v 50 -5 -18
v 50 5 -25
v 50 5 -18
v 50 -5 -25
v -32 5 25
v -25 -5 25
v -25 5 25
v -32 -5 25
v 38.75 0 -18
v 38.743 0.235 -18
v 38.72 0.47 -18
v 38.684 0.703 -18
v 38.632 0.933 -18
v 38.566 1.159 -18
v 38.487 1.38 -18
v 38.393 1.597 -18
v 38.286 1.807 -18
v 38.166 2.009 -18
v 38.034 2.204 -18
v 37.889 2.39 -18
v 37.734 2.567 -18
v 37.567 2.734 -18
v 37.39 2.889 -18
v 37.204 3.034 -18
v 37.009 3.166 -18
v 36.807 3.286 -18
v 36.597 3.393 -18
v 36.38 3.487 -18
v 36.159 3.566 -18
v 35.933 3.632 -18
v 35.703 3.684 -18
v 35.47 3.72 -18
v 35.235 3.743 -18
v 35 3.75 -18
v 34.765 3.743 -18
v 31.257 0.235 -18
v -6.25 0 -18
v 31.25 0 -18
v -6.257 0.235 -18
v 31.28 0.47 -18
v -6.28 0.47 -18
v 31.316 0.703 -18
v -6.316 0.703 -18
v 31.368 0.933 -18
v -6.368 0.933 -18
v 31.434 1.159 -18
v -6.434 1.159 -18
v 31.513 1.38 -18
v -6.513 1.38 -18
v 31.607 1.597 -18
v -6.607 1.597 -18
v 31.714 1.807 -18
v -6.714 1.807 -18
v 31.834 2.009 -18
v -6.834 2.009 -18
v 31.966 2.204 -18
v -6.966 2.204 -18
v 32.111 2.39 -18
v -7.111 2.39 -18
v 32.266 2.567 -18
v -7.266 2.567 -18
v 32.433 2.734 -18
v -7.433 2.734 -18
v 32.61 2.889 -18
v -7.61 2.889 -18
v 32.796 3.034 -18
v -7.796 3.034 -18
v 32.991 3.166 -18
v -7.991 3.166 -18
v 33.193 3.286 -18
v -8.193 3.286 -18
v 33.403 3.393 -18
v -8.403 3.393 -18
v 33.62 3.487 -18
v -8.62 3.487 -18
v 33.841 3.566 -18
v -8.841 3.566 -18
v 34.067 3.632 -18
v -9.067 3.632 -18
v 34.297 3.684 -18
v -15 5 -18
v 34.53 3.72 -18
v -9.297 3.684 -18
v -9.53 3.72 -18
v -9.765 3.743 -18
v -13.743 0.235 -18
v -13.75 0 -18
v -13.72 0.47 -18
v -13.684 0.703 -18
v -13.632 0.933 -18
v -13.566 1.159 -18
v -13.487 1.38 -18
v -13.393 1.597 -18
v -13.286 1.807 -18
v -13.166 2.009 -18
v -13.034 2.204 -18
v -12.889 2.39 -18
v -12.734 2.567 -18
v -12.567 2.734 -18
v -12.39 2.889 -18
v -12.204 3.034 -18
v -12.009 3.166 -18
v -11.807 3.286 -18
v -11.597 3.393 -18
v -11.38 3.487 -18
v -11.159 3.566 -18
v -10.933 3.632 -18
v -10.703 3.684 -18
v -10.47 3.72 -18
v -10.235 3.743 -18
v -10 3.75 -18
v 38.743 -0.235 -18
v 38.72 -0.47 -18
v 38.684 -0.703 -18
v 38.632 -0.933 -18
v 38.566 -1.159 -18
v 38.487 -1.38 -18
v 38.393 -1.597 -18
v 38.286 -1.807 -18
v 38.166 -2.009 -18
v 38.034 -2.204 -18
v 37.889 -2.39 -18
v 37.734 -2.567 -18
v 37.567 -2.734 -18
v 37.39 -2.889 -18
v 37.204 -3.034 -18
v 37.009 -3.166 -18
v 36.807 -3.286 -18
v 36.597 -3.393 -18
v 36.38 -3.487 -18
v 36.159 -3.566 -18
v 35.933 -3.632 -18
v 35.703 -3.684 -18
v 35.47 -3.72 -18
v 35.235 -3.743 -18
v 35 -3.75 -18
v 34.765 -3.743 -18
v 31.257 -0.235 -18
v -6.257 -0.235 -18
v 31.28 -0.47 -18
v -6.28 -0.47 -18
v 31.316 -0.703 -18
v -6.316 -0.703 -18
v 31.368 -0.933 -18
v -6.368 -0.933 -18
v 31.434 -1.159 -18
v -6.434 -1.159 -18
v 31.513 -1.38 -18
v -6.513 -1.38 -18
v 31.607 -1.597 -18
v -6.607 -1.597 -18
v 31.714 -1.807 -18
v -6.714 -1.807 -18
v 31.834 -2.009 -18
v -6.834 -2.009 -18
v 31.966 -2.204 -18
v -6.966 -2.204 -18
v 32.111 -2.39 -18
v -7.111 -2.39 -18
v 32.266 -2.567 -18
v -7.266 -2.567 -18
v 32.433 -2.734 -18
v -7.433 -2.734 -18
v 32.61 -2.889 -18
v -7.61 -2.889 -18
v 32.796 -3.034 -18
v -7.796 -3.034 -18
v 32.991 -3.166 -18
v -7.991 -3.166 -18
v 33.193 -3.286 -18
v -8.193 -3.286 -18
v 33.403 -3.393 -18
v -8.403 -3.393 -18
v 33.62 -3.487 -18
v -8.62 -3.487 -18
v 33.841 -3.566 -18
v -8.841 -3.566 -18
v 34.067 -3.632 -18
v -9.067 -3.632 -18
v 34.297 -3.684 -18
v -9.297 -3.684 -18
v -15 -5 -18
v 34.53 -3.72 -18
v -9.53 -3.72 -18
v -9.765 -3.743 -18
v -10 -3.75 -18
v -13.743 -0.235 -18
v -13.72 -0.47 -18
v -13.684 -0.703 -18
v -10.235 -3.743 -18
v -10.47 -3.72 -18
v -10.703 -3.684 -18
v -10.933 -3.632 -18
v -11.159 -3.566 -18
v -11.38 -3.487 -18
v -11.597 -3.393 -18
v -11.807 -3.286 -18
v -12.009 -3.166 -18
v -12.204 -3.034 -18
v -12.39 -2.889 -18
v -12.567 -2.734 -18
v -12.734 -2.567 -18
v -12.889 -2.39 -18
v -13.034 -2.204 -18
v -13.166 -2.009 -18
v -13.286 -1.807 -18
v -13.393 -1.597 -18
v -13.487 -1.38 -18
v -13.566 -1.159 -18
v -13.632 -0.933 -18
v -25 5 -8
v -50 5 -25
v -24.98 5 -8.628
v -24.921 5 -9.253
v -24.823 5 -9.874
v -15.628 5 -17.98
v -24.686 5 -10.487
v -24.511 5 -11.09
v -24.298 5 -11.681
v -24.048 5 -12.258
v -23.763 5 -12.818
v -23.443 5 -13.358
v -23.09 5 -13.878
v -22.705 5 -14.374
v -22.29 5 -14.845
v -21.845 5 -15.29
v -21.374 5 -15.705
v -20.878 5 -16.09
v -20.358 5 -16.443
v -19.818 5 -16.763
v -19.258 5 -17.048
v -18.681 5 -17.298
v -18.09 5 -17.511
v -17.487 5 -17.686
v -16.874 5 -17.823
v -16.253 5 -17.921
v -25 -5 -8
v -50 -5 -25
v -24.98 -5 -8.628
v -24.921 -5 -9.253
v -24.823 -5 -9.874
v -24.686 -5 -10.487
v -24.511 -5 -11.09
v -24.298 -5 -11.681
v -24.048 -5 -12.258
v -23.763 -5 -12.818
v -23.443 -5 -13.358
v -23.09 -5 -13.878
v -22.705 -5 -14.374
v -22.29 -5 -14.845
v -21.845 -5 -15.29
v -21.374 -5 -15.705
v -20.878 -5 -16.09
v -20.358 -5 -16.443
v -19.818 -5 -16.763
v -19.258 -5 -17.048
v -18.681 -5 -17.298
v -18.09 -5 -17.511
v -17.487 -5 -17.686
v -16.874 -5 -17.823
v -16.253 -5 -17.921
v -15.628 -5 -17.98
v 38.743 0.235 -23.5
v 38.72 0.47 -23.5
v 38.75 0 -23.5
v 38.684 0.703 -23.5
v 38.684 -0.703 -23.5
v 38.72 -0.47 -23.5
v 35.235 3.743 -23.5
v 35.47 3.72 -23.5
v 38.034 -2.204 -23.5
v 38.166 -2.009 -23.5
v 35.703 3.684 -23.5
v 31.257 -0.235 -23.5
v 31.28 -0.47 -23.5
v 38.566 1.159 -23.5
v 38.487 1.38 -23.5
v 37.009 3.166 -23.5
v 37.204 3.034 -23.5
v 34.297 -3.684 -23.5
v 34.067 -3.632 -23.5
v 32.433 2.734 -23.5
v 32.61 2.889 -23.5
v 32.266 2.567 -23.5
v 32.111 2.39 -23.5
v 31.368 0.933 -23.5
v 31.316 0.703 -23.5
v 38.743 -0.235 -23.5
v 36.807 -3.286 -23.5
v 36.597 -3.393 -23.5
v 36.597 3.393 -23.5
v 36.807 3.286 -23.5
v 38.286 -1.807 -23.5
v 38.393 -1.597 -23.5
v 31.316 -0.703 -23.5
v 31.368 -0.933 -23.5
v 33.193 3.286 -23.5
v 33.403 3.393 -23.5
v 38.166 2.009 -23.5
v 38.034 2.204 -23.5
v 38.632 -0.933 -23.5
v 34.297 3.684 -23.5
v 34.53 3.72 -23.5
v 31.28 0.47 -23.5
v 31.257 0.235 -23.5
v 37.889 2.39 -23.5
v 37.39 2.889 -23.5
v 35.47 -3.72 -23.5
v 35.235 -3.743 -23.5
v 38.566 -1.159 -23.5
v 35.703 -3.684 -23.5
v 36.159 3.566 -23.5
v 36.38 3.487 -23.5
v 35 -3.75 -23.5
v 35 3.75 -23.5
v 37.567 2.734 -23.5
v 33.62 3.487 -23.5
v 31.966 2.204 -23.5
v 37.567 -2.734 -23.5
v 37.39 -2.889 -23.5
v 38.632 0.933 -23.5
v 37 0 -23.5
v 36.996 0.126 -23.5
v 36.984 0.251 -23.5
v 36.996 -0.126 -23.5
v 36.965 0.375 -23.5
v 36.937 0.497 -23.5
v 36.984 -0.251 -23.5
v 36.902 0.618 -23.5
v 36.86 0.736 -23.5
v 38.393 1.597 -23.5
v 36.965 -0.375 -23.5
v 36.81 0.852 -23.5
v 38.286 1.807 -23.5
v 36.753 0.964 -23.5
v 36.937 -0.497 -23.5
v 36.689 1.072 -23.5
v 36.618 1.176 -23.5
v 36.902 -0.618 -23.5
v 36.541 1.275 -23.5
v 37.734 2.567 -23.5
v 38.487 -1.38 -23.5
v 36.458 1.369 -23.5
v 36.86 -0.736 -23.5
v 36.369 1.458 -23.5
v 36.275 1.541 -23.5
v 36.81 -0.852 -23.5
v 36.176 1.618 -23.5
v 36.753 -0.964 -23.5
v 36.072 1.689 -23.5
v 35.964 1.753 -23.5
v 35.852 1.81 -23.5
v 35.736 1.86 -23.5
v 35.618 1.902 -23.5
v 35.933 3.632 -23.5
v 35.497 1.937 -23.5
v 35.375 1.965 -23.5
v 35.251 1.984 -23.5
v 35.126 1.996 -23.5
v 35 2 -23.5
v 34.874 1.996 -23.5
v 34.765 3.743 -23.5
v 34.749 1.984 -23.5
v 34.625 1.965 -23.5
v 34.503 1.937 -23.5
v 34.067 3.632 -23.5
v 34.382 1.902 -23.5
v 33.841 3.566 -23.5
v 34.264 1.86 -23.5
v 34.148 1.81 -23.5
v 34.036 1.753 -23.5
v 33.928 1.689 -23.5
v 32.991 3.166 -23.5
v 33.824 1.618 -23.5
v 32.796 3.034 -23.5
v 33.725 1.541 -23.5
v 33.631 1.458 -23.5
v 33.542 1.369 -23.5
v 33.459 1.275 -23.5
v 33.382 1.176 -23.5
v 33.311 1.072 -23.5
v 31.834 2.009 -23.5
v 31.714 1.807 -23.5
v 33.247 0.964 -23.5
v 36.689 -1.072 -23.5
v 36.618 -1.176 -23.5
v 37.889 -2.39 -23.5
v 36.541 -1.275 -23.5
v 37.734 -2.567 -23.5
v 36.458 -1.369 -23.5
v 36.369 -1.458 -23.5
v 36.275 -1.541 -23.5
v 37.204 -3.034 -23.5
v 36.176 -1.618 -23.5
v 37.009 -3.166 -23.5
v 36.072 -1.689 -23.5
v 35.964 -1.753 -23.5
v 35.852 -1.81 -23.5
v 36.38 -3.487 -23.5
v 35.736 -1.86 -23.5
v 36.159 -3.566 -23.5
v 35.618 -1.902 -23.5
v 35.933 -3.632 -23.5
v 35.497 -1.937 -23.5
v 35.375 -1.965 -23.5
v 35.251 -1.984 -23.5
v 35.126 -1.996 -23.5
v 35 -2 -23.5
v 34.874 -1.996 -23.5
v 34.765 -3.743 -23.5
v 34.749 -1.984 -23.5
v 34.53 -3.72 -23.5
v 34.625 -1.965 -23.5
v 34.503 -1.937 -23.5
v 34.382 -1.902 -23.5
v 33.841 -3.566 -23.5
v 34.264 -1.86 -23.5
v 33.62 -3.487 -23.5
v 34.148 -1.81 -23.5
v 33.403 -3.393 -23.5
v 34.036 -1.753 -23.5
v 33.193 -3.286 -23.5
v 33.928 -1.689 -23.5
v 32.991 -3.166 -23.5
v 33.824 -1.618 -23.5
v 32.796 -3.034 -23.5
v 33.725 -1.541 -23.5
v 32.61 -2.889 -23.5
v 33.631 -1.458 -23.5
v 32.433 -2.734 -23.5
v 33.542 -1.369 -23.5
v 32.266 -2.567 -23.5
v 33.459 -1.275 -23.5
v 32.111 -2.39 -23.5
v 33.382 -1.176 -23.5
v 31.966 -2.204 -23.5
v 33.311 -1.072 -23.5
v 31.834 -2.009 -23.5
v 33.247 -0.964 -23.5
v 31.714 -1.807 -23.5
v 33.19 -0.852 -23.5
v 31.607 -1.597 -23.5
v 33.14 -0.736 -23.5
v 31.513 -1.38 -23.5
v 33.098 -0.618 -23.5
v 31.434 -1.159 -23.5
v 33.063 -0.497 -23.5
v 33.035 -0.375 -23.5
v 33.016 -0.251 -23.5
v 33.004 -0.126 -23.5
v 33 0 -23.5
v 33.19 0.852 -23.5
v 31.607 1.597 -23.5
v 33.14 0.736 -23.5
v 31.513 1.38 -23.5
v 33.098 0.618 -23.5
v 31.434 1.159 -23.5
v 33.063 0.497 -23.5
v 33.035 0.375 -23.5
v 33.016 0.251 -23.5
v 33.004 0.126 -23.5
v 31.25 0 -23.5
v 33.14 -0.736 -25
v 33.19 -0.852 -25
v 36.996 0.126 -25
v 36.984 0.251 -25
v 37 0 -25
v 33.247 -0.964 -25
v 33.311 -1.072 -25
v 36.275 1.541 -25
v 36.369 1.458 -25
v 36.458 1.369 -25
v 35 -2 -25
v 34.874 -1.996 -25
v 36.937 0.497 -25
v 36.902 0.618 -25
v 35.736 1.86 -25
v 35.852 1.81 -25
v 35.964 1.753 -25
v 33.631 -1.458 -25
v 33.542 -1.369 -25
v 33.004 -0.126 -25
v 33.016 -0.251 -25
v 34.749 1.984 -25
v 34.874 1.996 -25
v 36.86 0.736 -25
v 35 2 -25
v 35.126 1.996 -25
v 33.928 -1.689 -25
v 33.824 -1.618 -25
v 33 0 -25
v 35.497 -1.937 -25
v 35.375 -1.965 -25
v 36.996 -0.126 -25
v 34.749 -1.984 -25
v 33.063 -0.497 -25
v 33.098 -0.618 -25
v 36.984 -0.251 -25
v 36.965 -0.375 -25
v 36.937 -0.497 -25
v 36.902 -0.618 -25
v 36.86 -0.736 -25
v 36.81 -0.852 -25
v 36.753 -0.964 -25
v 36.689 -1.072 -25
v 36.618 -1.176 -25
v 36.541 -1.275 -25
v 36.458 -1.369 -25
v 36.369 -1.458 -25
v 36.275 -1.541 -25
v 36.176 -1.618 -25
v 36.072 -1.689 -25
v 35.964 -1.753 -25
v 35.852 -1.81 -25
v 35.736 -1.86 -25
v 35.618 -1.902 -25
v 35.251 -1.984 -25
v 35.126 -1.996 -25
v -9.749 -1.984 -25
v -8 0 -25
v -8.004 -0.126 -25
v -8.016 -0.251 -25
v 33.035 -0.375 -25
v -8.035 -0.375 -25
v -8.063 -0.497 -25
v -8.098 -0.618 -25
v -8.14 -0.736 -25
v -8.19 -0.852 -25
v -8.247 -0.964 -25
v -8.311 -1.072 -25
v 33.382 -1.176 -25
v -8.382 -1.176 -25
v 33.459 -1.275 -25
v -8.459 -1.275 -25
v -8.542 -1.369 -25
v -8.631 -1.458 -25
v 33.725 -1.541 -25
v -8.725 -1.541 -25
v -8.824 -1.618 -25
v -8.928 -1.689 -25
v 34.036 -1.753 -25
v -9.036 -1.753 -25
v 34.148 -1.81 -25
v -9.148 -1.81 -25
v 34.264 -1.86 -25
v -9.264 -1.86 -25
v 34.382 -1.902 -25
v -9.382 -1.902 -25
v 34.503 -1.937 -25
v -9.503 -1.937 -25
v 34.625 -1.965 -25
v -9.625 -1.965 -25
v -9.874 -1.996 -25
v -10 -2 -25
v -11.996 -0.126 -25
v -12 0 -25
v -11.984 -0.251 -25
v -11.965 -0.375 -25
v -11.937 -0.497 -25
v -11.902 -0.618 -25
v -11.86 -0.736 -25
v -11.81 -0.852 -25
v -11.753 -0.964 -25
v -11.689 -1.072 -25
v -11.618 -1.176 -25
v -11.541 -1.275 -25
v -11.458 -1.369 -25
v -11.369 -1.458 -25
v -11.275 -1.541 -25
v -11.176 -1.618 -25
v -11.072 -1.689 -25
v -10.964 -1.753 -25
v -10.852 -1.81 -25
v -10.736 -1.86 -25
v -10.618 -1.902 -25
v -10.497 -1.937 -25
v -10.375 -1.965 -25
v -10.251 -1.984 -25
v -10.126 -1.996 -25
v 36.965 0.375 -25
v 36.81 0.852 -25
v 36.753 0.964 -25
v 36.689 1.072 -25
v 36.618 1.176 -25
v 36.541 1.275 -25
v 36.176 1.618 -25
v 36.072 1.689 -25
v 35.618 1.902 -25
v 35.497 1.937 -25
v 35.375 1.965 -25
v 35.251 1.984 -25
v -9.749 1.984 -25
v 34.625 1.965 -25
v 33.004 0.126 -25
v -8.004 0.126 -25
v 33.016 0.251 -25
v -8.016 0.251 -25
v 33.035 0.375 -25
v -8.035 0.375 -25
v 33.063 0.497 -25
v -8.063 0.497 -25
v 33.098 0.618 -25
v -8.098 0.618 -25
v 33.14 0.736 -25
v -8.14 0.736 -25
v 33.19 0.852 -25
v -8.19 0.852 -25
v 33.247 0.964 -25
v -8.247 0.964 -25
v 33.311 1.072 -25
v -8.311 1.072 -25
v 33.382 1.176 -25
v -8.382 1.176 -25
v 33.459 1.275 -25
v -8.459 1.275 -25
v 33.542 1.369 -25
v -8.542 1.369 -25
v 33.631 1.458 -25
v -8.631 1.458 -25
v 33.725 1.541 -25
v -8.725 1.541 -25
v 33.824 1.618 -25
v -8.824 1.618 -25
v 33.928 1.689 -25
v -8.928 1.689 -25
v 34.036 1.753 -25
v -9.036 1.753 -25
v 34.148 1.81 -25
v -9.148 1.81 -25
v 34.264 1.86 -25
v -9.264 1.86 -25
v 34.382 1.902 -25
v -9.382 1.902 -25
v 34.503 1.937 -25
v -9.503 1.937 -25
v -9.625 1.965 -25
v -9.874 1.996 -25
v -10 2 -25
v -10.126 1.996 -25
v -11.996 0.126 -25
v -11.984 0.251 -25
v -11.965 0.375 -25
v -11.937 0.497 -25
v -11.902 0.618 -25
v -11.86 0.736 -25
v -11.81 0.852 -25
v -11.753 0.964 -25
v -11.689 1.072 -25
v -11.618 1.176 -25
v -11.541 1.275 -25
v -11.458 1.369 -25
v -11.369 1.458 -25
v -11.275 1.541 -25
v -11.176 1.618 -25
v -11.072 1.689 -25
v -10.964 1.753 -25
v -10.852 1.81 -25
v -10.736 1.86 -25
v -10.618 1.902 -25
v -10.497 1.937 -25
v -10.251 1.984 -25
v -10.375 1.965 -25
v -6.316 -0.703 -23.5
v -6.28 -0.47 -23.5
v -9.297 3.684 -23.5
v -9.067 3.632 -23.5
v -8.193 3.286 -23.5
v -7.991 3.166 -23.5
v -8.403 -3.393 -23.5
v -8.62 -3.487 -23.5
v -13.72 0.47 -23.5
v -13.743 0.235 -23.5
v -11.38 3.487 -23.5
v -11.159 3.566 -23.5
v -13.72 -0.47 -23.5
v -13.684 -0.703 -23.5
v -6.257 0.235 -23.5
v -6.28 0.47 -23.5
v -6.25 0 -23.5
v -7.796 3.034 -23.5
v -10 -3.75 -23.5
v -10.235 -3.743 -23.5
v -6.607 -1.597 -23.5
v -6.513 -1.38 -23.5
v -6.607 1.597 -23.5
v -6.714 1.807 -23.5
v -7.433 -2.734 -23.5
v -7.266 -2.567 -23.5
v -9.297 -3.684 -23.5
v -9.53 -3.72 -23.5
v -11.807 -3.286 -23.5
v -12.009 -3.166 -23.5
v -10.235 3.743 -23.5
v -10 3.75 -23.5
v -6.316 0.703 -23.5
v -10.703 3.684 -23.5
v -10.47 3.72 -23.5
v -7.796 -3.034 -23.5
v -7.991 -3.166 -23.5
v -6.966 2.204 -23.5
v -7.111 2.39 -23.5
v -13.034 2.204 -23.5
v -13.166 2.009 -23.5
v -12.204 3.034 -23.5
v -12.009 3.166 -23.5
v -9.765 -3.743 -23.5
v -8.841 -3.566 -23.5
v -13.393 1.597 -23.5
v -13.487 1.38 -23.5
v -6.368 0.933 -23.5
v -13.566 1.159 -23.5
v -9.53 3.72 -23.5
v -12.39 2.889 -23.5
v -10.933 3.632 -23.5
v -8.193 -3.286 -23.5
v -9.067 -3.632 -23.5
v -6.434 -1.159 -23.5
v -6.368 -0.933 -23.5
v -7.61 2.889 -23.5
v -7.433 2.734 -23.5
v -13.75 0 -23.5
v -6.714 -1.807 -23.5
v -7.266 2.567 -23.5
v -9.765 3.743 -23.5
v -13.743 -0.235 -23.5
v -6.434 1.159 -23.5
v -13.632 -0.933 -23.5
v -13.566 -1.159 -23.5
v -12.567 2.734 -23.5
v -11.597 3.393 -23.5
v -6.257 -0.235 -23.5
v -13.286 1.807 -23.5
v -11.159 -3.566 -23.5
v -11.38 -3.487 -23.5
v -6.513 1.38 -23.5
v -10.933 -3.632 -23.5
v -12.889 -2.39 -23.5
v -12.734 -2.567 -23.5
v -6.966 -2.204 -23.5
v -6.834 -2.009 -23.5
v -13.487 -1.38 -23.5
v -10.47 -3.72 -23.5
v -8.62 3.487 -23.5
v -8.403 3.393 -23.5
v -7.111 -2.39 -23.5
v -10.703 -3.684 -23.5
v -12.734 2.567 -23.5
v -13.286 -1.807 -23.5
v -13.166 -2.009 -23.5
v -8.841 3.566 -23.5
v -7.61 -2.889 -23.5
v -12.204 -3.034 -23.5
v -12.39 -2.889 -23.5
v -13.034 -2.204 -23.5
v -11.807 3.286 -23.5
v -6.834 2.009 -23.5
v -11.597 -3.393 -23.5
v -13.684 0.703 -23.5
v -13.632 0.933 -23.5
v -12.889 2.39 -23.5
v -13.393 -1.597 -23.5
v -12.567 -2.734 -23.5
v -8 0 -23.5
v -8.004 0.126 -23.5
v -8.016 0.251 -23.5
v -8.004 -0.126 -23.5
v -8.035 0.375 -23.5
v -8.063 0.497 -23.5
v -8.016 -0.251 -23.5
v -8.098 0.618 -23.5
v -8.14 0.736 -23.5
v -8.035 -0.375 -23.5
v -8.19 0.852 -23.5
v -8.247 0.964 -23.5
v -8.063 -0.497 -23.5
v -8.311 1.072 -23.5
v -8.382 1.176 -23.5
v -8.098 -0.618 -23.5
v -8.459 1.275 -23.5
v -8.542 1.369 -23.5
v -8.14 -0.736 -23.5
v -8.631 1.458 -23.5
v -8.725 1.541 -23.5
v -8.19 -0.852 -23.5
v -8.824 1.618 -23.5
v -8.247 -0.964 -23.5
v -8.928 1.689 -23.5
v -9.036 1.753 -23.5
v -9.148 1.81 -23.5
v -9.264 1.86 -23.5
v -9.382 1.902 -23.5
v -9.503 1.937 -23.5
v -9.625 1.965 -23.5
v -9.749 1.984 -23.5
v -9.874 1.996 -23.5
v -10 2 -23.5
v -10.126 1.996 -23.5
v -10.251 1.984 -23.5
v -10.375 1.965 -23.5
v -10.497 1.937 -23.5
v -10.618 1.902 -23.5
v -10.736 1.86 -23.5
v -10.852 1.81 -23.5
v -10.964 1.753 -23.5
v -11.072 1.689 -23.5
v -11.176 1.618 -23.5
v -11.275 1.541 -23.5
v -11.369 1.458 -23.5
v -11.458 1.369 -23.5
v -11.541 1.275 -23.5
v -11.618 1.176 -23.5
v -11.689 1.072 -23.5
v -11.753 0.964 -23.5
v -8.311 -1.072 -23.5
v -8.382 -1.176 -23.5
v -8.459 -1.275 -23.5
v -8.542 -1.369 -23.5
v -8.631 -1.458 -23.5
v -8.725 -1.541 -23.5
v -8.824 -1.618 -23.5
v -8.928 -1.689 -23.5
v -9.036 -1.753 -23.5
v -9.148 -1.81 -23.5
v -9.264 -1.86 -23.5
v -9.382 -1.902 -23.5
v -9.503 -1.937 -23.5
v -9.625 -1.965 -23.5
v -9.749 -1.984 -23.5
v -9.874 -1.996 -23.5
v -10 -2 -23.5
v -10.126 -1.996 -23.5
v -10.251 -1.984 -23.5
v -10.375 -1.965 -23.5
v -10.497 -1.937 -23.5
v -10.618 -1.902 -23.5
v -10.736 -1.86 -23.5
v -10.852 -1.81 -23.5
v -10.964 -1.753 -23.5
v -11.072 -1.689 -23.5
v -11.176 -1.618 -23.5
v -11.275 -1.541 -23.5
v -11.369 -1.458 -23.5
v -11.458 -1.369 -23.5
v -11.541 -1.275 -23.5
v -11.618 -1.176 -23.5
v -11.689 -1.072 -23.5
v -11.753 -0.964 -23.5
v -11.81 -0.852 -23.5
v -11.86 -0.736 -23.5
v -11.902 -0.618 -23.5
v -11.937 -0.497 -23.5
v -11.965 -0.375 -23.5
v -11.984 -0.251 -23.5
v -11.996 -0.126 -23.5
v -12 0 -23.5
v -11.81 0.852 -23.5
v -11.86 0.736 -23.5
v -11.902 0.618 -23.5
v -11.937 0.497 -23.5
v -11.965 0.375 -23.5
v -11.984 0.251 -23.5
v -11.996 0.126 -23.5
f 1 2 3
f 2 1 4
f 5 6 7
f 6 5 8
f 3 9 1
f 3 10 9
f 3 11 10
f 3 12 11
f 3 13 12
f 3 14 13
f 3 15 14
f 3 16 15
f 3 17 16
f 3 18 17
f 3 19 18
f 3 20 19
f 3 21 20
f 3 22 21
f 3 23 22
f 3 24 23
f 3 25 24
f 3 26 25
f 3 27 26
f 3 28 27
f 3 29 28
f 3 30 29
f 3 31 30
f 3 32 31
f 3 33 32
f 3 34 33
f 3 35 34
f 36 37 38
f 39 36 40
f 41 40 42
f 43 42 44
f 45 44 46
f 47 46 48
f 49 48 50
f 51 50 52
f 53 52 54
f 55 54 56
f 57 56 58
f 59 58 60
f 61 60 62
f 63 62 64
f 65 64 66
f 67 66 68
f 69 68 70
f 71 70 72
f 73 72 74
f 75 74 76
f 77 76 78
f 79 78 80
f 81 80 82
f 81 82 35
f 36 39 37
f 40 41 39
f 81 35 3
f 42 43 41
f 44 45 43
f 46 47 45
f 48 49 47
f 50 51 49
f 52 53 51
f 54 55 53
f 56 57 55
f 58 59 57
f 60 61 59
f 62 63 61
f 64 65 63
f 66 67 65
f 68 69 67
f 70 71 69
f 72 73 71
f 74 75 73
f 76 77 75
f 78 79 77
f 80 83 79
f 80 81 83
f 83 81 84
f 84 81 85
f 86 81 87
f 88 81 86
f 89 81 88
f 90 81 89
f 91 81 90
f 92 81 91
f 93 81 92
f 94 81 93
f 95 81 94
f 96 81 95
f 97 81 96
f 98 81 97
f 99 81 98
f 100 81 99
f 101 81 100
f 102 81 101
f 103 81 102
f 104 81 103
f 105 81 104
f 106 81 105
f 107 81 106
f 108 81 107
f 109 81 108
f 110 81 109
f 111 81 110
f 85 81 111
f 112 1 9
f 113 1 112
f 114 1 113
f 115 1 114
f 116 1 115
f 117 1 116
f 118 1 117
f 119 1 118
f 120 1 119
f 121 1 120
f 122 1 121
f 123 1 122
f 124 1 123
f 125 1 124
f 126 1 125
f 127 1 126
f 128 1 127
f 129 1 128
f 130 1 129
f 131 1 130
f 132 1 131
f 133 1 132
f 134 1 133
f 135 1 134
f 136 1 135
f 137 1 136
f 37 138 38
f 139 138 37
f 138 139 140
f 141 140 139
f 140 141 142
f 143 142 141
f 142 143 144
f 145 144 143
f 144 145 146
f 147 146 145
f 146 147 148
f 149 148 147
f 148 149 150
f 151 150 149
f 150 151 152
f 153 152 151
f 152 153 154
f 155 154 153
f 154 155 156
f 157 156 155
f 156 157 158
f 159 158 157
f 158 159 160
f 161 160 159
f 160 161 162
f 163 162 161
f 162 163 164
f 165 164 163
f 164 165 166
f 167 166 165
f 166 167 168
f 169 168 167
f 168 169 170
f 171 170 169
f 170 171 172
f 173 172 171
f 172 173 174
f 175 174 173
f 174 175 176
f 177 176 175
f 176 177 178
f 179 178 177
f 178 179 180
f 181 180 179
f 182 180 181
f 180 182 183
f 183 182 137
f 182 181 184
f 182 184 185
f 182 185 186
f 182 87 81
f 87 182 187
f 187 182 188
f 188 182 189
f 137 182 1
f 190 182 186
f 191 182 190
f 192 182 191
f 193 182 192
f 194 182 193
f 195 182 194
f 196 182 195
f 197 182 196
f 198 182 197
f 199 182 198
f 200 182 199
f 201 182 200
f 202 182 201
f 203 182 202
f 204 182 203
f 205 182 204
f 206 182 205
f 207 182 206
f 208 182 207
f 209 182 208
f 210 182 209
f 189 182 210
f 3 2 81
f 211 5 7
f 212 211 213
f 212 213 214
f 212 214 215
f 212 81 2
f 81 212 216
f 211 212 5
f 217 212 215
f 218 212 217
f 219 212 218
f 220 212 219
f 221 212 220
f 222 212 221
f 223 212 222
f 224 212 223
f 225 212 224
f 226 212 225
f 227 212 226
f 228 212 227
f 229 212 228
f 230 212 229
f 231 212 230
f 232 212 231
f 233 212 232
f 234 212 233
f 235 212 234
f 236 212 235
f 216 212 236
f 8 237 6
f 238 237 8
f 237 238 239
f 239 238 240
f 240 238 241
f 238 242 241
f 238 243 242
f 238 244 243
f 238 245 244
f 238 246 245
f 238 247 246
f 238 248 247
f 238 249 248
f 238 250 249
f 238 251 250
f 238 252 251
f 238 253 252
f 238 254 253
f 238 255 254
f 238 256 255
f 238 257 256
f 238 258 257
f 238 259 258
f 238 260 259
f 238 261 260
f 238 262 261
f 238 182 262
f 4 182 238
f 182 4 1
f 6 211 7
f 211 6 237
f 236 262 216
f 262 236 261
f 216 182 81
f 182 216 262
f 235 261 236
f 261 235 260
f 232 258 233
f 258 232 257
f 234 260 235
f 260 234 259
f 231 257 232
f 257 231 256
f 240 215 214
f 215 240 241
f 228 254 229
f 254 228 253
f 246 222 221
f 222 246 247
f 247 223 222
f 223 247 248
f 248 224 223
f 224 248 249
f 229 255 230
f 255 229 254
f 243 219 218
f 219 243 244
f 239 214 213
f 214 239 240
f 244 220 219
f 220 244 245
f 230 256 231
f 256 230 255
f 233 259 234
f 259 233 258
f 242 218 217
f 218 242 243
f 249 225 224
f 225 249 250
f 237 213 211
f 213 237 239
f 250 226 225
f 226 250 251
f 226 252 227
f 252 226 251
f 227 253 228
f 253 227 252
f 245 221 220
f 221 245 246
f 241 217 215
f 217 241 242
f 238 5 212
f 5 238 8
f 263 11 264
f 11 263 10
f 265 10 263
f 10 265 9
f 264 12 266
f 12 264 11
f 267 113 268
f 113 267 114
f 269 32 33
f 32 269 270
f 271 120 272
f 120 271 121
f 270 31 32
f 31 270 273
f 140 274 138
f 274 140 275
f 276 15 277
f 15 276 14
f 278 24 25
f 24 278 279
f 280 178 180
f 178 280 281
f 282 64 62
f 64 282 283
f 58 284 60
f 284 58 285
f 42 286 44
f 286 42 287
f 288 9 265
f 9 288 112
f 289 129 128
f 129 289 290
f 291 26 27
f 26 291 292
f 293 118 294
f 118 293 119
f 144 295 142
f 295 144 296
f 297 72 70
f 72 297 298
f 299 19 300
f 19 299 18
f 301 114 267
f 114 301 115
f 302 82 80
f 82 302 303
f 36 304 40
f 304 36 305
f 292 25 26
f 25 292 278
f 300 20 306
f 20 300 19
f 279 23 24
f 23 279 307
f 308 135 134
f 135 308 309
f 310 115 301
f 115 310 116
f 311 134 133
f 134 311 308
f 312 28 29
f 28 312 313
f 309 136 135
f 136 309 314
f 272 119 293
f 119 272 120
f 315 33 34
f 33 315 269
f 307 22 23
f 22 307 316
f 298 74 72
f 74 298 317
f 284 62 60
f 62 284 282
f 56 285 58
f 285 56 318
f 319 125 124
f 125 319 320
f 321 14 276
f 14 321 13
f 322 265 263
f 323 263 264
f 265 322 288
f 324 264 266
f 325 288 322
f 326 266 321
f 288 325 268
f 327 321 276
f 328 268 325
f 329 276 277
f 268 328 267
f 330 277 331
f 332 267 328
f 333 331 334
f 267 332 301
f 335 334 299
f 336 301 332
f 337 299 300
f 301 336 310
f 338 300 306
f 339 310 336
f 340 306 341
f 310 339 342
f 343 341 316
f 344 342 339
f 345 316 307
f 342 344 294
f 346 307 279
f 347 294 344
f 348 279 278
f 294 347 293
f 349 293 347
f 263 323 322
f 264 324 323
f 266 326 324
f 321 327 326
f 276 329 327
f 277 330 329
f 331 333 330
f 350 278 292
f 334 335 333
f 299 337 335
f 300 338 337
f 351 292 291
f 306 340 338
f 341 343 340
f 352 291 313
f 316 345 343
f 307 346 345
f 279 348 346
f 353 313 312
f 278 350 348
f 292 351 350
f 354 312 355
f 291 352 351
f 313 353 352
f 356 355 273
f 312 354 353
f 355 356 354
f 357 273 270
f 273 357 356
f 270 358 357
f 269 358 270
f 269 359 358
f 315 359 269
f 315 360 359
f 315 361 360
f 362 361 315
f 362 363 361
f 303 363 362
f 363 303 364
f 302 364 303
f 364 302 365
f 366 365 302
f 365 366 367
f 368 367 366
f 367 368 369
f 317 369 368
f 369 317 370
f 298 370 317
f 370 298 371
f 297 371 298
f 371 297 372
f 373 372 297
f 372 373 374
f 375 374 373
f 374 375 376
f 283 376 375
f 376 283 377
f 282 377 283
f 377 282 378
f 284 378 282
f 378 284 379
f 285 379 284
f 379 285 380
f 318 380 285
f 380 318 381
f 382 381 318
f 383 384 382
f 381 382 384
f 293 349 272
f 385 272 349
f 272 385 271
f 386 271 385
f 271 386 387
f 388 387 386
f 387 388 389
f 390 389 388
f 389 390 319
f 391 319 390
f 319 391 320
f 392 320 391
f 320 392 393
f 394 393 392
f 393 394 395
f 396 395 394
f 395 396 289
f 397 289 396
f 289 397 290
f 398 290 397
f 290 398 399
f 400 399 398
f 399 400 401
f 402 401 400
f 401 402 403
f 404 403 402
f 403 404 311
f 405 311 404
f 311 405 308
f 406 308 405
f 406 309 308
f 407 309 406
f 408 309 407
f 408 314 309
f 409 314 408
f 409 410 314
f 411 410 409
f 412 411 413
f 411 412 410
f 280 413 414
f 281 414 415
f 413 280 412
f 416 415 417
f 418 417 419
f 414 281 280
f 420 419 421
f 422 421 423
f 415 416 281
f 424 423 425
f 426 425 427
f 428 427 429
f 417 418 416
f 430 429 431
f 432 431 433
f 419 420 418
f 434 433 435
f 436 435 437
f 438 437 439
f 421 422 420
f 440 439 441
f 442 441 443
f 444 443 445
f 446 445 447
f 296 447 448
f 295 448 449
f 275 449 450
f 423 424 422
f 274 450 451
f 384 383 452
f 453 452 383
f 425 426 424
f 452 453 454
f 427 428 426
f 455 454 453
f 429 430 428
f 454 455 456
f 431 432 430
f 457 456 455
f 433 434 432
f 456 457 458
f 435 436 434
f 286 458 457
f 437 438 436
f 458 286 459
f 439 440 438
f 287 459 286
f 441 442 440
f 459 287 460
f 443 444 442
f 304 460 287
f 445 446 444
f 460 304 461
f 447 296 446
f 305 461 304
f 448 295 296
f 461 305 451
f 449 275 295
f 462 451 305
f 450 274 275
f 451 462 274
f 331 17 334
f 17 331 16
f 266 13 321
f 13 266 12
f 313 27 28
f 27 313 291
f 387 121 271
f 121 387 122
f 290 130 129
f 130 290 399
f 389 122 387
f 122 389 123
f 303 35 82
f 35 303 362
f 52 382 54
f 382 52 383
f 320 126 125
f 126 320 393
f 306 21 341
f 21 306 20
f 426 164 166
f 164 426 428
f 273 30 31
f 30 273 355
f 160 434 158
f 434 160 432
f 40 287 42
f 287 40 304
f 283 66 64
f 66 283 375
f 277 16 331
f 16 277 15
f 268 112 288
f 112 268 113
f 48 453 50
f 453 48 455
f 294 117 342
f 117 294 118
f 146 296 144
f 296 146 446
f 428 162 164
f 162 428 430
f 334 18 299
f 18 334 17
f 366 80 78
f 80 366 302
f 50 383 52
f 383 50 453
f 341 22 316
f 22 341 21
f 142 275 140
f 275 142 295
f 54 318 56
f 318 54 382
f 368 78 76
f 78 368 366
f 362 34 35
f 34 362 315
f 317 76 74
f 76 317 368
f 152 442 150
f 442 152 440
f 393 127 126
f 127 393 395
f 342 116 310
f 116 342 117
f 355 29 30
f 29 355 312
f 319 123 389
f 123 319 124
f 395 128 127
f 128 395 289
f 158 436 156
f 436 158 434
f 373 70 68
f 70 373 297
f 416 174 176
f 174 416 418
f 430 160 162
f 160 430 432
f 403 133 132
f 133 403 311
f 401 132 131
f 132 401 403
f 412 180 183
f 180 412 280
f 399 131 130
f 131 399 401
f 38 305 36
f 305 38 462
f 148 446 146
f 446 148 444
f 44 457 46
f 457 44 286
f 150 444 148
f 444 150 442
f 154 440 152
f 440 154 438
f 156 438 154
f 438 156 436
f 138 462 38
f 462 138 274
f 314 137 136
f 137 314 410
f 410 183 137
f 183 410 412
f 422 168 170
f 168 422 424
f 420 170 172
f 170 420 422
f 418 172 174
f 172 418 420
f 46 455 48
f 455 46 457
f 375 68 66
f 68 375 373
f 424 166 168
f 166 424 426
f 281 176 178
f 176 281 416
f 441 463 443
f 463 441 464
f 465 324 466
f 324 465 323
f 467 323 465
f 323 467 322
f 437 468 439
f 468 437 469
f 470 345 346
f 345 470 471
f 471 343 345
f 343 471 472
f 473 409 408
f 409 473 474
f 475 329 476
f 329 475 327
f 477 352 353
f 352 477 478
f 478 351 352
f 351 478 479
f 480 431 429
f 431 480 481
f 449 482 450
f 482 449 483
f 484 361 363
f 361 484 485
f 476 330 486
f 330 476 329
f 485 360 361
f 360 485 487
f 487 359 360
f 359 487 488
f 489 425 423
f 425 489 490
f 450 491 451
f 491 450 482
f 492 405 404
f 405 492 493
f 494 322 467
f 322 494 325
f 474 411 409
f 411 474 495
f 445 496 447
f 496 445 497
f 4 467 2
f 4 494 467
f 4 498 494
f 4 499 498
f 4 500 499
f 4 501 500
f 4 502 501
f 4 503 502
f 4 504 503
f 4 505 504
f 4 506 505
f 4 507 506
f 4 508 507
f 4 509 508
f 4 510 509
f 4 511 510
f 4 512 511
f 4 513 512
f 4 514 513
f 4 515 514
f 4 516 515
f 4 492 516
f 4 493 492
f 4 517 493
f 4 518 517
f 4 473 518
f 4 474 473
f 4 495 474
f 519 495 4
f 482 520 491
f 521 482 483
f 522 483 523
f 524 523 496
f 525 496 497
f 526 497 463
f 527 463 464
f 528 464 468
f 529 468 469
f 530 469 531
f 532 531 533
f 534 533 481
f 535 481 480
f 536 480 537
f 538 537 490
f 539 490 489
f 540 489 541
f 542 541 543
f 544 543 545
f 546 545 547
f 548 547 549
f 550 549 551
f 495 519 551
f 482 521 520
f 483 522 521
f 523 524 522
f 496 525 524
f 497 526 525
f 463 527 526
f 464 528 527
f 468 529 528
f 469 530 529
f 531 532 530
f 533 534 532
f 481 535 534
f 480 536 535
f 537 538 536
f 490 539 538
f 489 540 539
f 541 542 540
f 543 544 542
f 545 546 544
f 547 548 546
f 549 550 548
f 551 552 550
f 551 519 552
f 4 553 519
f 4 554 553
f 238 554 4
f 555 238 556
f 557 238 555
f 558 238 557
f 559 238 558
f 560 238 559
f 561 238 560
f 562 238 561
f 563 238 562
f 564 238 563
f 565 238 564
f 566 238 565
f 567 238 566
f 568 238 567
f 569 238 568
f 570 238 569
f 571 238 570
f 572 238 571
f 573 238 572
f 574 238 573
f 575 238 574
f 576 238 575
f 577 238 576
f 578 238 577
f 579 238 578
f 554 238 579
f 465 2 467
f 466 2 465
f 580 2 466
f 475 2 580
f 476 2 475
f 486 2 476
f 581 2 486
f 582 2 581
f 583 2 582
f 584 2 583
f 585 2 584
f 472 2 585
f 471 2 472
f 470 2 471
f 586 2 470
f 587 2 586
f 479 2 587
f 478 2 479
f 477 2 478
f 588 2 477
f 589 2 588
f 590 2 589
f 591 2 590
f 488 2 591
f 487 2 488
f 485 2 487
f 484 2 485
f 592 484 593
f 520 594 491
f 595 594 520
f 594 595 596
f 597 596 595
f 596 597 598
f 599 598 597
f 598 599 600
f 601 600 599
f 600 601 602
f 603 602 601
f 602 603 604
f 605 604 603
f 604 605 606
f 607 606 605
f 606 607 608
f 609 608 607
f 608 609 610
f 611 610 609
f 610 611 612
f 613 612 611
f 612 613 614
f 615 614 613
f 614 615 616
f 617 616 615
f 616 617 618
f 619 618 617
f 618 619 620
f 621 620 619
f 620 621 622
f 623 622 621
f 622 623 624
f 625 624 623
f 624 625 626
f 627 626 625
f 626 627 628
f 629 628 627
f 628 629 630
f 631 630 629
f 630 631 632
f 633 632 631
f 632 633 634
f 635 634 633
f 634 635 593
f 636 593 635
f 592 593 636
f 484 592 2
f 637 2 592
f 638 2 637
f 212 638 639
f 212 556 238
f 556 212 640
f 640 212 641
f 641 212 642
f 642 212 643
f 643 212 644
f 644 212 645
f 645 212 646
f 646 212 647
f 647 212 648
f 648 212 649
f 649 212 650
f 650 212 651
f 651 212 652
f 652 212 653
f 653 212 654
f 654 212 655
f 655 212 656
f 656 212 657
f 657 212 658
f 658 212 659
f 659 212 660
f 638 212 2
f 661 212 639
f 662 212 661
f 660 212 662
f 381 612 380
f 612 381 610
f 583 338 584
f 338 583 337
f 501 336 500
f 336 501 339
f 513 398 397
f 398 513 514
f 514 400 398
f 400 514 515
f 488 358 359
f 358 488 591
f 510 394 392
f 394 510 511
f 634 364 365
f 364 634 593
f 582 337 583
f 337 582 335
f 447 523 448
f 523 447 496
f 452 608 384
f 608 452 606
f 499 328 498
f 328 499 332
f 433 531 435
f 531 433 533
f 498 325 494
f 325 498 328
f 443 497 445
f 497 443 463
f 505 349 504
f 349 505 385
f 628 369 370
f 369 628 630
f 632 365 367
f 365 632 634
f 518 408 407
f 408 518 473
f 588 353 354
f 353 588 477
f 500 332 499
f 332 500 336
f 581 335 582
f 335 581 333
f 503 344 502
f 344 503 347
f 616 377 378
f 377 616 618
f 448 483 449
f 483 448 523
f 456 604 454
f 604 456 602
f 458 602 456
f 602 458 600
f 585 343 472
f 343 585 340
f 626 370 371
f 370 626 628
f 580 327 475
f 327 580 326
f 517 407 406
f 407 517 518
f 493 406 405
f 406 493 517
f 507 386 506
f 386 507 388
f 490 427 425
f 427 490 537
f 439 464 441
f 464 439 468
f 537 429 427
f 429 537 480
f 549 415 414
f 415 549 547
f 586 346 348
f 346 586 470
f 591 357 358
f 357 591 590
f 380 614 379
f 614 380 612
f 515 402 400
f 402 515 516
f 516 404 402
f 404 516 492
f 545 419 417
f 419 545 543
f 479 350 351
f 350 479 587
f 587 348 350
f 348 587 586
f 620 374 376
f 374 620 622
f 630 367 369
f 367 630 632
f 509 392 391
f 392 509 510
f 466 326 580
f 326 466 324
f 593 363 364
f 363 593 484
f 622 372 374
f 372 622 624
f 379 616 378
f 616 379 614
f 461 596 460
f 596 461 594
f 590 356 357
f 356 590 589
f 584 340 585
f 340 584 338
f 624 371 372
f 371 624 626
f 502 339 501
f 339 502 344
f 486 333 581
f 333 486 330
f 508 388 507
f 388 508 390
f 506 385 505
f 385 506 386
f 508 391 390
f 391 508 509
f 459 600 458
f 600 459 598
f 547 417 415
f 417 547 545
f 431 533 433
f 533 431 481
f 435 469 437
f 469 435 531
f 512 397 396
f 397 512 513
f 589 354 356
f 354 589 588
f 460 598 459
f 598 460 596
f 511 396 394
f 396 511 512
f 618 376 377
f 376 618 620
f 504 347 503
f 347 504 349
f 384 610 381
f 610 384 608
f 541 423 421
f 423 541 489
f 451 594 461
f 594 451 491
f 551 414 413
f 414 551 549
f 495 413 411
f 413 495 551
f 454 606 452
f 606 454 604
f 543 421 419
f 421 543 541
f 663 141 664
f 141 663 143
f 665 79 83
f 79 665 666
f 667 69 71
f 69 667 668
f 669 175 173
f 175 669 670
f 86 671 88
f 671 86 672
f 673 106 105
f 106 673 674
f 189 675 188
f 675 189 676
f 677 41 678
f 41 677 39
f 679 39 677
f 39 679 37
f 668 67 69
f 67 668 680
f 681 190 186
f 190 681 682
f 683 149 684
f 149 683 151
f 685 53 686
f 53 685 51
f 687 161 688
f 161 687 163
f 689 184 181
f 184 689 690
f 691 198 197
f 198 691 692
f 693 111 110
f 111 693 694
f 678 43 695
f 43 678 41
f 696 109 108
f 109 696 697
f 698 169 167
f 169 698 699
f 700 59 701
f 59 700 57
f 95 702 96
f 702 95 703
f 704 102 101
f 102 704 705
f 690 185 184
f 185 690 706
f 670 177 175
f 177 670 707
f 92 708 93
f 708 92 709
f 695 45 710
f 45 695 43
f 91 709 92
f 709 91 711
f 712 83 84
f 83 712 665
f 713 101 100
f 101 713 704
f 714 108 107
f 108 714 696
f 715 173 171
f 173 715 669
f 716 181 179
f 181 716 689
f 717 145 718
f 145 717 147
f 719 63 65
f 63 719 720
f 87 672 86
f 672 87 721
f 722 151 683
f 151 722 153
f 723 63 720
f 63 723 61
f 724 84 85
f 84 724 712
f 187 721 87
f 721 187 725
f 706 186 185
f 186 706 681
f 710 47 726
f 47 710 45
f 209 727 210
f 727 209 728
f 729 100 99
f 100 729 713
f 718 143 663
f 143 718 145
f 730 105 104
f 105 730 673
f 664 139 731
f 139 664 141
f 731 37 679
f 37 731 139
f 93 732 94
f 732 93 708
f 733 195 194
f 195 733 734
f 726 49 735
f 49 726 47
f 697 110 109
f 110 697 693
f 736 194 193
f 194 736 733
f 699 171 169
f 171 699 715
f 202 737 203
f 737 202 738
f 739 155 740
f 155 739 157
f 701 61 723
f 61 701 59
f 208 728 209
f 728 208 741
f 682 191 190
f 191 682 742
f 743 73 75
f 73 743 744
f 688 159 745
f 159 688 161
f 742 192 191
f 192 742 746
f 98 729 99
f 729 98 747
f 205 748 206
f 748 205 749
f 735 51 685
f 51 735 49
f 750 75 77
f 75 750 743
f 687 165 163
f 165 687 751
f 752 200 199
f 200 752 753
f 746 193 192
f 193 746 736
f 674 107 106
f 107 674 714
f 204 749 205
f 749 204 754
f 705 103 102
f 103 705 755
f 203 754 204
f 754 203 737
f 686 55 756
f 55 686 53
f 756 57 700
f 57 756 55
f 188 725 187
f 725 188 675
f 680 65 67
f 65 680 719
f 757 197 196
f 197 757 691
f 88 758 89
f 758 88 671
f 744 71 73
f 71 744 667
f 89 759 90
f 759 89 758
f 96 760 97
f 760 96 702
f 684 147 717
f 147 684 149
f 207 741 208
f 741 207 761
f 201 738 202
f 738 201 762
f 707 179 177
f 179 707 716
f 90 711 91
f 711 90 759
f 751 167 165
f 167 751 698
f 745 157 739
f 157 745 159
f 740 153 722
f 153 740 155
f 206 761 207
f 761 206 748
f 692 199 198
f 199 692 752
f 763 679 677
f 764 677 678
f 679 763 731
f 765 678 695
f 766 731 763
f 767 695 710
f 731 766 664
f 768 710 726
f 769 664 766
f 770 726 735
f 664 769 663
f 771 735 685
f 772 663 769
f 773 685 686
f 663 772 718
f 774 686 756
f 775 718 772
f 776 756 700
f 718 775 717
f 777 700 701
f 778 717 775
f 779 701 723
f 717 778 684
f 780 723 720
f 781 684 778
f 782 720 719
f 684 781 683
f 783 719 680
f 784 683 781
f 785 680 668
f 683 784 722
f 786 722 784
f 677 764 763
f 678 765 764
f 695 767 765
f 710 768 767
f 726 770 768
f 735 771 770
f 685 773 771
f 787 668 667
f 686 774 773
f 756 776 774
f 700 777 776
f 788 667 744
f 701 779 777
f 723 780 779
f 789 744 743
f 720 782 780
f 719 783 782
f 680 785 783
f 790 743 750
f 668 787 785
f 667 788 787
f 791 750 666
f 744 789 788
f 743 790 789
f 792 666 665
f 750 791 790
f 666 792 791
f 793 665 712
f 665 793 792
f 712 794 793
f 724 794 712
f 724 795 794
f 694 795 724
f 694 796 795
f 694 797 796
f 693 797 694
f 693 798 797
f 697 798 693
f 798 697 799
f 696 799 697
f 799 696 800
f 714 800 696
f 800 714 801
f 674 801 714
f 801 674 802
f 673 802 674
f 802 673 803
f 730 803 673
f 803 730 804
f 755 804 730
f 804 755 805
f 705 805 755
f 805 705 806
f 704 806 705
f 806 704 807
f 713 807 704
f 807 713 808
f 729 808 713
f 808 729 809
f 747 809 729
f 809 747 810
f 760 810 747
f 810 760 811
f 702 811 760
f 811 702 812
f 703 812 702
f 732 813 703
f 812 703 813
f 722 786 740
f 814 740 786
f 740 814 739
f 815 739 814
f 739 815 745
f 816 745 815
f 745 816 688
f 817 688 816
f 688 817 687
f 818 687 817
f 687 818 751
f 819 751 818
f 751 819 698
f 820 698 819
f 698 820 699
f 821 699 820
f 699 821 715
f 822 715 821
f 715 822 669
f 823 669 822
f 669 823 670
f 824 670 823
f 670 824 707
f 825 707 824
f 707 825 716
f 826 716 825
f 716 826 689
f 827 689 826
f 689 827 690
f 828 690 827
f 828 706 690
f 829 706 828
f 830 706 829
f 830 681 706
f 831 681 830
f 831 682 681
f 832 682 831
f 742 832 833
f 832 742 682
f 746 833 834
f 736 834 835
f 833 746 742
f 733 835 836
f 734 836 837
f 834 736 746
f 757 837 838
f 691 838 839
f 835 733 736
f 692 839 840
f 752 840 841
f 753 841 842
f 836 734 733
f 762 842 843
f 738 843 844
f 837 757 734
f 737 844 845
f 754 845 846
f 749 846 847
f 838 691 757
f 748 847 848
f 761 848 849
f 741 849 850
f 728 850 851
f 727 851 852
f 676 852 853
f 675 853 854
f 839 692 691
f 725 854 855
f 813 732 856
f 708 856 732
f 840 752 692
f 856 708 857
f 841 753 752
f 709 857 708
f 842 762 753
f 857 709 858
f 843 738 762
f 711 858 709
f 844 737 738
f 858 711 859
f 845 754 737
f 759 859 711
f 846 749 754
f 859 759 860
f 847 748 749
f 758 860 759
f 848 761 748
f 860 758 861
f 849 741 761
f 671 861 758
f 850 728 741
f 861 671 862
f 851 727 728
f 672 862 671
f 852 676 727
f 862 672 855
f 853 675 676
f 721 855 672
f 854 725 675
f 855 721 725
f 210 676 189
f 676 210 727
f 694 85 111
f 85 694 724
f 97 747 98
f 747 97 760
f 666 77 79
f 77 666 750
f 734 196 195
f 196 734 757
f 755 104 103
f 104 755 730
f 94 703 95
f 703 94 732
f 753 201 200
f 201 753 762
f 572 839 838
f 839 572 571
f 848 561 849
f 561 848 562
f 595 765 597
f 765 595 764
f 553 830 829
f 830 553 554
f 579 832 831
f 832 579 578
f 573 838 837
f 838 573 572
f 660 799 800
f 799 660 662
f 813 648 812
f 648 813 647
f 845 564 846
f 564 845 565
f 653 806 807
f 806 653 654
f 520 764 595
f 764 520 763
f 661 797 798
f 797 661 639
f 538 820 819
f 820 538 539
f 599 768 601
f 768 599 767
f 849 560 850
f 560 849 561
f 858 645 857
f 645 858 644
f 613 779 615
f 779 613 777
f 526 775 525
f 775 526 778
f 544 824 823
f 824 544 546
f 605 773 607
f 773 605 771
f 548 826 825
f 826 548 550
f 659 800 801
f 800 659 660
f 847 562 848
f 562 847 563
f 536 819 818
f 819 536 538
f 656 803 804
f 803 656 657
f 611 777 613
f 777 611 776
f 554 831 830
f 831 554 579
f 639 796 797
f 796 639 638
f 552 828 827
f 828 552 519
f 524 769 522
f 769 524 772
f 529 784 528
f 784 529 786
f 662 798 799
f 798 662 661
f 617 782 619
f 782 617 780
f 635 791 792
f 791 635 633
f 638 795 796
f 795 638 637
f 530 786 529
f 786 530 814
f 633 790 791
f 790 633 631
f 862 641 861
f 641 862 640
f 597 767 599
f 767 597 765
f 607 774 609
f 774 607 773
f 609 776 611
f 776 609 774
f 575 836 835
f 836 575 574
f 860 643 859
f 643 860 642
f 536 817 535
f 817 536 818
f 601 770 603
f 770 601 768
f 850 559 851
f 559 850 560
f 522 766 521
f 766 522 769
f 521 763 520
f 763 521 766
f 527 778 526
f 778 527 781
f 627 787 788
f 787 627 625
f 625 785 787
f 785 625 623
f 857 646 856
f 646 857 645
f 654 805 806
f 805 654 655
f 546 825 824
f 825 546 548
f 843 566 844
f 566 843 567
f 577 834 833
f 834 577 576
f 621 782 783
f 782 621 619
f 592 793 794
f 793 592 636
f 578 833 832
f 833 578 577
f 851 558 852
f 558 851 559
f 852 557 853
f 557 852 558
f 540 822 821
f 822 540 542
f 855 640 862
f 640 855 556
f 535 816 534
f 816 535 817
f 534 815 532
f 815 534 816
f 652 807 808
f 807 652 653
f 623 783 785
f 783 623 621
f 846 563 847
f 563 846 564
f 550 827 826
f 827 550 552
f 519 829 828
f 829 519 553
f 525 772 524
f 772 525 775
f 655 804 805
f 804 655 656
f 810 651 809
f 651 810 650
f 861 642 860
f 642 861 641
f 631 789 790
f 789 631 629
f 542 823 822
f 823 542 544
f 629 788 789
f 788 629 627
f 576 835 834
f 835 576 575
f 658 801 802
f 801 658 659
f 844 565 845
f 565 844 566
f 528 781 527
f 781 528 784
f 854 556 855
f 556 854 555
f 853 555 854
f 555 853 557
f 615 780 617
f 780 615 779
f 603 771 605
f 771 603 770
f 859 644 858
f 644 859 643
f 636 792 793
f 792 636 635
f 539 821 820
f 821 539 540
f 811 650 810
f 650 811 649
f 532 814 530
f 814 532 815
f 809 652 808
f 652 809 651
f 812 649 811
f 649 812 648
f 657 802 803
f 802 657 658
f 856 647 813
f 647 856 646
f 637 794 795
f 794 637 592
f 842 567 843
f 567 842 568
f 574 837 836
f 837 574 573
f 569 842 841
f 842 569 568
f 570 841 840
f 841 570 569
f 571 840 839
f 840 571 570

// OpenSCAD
/*
    Title: Foot.scad
    Description: Support foot to hold the hard drive stand.
    Author: Matias Micheletto
    Date: 12-Jul-2019
    Email: matias.micheletto@uns.edu.ar
    Website: https://matiasmicheletto.github.io
*/

$fn = 100;

// Dimensions
L = 100; // Foot lenth
H = 50; // Height
W = 10; // Width
R = 10; // Radius of curved angle

// Screw holes
sep = 45; // Separation
db = 15; // Distance to the border of the foot


module envelope(){
    cube([L,W,H], center = true);
}

L2 = L*0.75; H2 = H-7; // Lenght and height to remove for the center hole
w = L-L2-H+H2; s = sqrt(H*H+w*w); // Dimensions of the diagonal rectangle

module rem(){
    union(){ // Interior cropping
        translate([(L-L2+R)/2,0,(H-H2)/2])
            cube([(L2-R),W,H2], center = true);
        
        translate([(L-L2)/2,0,(H-H2+R)/2])
            cube([L2,W,H2-R], center = true);
        
        translate([L/2-L2+R,0,H/2-H2+R])
        rotate([0,90,90])
            cylinder(r = R, h = W+1, center = true);
    }
    
    // Diagonal cropping
    translate([-L/2,-W/2,-H/2])
    rotate([0,-asin(H/s),0])
        cube([s,W,w*H/s]);
}

Rh1 = 3.75; // Radius for the screw's head
Rh2 = 2; // Radius for the screw's trhead
ph = 1.5; // Adjusting zone thickness
module holes(){
    
    translate([L/2-db,0,-H2/2+ph/2])
        cylinder(r = Rh1, h = H-H2-ph, center = true);
    translate([L/2-db,0,-H2/2])
        cylinder(r = Rh2, h = H-H2, center = true);
    
    translate([L/2-db-sep,0,-H2/2+ph/2])
        cylinder(r = Rh1, h = H-H2-ph, center = true);
    translate([L/2-db-sep,0,-H2/2])
        cylinder(r = Rh2, h = H-H2, center = true);
}

//rotate([0,180+asin(H/s),0]) // Vertical display (to visualize)
difference(){
    envelope();
    rem();
    holes();
}
